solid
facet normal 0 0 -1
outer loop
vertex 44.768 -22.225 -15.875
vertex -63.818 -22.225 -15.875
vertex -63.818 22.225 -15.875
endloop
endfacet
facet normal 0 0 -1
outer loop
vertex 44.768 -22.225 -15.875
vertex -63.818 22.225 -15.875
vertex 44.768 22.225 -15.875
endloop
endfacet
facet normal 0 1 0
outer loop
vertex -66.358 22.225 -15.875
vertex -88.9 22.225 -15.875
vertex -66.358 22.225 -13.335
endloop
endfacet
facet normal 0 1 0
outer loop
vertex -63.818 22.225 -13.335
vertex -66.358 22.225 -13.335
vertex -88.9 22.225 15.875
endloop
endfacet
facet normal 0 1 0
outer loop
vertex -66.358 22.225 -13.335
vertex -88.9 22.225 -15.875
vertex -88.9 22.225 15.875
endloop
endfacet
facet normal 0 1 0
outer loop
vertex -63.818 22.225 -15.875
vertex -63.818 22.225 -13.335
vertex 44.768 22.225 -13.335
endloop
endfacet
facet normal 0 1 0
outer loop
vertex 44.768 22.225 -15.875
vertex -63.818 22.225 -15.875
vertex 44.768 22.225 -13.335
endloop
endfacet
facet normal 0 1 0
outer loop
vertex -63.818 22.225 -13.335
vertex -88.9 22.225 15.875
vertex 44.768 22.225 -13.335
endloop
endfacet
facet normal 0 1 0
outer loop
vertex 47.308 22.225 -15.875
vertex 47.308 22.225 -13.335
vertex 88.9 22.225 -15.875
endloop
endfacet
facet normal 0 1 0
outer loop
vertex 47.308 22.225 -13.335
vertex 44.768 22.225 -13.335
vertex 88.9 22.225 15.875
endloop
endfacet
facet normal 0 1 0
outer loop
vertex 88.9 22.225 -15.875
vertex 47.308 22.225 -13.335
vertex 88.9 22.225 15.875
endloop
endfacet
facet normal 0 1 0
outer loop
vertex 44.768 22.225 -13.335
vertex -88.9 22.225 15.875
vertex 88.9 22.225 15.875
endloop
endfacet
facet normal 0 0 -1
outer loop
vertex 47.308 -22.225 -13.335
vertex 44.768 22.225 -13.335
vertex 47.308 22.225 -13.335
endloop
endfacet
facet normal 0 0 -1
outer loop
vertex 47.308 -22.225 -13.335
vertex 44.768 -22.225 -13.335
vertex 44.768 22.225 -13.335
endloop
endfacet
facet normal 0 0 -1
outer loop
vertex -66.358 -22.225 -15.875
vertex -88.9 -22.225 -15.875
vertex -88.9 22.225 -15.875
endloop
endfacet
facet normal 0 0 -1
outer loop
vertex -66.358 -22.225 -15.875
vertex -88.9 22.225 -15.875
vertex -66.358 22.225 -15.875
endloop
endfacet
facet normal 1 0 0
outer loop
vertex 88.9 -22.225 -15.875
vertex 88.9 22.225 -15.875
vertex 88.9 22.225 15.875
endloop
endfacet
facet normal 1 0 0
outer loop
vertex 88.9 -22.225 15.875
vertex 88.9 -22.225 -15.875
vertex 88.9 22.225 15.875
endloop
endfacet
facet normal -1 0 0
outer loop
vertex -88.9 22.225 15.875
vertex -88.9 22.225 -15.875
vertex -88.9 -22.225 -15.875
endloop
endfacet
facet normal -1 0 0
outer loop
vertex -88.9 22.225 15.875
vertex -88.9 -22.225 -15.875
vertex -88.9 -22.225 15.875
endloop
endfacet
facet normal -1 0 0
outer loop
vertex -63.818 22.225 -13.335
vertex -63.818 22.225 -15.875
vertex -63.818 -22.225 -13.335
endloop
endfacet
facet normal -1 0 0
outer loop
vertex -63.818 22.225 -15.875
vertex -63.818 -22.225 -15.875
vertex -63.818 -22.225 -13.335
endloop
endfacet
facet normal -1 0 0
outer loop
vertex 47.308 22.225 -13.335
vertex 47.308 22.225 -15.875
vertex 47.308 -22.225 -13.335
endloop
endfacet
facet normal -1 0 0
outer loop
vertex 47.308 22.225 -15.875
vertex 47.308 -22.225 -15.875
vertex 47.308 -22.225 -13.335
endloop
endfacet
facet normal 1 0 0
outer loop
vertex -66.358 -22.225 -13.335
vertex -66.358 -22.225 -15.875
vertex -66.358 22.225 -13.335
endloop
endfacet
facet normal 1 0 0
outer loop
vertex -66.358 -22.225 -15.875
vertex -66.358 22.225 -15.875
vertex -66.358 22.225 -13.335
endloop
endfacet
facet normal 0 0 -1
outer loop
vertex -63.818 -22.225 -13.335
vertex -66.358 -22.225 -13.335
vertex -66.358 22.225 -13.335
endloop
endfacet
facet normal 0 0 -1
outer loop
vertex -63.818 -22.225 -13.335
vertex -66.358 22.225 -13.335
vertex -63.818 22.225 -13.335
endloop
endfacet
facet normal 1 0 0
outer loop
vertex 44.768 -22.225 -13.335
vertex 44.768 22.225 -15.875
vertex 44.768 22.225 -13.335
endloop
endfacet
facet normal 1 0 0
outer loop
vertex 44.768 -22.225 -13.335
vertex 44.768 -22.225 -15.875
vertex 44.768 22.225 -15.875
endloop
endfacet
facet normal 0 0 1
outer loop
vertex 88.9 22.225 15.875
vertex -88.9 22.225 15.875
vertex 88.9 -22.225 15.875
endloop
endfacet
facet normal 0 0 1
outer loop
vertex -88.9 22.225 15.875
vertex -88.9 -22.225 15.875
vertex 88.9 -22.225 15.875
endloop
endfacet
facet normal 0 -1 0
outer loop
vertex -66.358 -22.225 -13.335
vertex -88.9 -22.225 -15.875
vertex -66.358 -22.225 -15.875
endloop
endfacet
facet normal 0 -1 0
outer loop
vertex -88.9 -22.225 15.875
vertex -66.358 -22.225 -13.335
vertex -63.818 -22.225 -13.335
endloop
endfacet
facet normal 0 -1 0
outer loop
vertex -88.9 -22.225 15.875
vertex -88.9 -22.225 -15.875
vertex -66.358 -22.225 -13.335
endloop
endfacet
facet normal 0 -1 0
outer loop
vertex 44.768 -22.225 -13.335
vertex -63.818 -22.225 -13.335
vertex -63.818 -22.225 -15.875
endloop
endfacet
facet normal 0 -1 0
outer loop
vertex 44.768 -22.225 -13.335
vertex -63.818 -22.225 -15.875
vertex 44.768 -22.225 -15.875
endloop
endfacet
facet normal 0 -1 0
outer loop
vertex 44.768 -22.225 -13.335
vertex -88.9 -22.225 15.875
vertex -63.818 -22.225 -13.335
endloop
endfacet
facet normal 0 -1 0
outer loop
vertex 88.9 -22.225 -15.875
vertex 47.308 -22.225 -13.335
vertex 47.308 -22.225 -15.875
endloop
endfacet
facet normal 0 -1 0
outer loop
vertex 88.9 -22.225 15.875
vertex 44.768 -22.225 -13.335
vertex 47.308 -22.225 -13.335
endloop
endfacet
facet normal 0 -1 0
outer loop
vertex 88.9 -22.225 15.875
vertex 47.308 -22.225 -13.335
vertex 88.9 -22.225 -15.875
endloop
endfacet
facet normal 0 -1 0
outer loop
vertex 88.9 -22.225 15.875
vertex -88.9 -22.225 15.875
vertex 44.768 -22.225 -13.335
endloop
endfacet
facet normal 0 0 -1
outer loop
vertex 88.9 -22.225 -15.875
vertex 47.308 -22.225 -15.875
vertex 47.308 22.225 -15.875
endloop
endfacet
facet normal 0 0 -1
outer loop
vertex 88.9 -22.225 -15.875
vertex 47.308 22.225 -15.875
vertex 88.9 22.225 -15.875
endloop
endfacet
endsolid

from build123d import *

# Parameters (mm, degrees)
F0_W          = 177.8
F0_H          = 31.75
F4_DEPTH      = 22.225
F1_W          = 2.54
F1_H          = 2.54
F2_DEPTH      = 22.225
F2_DEPTH_BACK = 22.225


with BuildPart() as f4:
    # F0 (on Front) → F4 (new body, symmetric)
    with BuildSketch(Plane.XZ):
        Rectangle(F0_W, F0_H)
    extrude(amount=F4_DEPTH, both=True)

    # F1 (on Front) → F2 (cut, two sides)
    with BuildSketch(Plane.XZ) as f2_sk:
        with Locations((-65.0875, -14.605)):
            Rectangle(F1_W, F1_H)
        with Locations((46.0375, -14.605)):
            Rectangle(F1_W, F1_H)
    extrude(amount=F2_DEPTH, mode=Mode.SUBTRACT)
    extrude(f2_sk.sketch, amount=-F2_DEPTH_BACK, mode=Mode.SUBTRACT)


solid = f4.part
